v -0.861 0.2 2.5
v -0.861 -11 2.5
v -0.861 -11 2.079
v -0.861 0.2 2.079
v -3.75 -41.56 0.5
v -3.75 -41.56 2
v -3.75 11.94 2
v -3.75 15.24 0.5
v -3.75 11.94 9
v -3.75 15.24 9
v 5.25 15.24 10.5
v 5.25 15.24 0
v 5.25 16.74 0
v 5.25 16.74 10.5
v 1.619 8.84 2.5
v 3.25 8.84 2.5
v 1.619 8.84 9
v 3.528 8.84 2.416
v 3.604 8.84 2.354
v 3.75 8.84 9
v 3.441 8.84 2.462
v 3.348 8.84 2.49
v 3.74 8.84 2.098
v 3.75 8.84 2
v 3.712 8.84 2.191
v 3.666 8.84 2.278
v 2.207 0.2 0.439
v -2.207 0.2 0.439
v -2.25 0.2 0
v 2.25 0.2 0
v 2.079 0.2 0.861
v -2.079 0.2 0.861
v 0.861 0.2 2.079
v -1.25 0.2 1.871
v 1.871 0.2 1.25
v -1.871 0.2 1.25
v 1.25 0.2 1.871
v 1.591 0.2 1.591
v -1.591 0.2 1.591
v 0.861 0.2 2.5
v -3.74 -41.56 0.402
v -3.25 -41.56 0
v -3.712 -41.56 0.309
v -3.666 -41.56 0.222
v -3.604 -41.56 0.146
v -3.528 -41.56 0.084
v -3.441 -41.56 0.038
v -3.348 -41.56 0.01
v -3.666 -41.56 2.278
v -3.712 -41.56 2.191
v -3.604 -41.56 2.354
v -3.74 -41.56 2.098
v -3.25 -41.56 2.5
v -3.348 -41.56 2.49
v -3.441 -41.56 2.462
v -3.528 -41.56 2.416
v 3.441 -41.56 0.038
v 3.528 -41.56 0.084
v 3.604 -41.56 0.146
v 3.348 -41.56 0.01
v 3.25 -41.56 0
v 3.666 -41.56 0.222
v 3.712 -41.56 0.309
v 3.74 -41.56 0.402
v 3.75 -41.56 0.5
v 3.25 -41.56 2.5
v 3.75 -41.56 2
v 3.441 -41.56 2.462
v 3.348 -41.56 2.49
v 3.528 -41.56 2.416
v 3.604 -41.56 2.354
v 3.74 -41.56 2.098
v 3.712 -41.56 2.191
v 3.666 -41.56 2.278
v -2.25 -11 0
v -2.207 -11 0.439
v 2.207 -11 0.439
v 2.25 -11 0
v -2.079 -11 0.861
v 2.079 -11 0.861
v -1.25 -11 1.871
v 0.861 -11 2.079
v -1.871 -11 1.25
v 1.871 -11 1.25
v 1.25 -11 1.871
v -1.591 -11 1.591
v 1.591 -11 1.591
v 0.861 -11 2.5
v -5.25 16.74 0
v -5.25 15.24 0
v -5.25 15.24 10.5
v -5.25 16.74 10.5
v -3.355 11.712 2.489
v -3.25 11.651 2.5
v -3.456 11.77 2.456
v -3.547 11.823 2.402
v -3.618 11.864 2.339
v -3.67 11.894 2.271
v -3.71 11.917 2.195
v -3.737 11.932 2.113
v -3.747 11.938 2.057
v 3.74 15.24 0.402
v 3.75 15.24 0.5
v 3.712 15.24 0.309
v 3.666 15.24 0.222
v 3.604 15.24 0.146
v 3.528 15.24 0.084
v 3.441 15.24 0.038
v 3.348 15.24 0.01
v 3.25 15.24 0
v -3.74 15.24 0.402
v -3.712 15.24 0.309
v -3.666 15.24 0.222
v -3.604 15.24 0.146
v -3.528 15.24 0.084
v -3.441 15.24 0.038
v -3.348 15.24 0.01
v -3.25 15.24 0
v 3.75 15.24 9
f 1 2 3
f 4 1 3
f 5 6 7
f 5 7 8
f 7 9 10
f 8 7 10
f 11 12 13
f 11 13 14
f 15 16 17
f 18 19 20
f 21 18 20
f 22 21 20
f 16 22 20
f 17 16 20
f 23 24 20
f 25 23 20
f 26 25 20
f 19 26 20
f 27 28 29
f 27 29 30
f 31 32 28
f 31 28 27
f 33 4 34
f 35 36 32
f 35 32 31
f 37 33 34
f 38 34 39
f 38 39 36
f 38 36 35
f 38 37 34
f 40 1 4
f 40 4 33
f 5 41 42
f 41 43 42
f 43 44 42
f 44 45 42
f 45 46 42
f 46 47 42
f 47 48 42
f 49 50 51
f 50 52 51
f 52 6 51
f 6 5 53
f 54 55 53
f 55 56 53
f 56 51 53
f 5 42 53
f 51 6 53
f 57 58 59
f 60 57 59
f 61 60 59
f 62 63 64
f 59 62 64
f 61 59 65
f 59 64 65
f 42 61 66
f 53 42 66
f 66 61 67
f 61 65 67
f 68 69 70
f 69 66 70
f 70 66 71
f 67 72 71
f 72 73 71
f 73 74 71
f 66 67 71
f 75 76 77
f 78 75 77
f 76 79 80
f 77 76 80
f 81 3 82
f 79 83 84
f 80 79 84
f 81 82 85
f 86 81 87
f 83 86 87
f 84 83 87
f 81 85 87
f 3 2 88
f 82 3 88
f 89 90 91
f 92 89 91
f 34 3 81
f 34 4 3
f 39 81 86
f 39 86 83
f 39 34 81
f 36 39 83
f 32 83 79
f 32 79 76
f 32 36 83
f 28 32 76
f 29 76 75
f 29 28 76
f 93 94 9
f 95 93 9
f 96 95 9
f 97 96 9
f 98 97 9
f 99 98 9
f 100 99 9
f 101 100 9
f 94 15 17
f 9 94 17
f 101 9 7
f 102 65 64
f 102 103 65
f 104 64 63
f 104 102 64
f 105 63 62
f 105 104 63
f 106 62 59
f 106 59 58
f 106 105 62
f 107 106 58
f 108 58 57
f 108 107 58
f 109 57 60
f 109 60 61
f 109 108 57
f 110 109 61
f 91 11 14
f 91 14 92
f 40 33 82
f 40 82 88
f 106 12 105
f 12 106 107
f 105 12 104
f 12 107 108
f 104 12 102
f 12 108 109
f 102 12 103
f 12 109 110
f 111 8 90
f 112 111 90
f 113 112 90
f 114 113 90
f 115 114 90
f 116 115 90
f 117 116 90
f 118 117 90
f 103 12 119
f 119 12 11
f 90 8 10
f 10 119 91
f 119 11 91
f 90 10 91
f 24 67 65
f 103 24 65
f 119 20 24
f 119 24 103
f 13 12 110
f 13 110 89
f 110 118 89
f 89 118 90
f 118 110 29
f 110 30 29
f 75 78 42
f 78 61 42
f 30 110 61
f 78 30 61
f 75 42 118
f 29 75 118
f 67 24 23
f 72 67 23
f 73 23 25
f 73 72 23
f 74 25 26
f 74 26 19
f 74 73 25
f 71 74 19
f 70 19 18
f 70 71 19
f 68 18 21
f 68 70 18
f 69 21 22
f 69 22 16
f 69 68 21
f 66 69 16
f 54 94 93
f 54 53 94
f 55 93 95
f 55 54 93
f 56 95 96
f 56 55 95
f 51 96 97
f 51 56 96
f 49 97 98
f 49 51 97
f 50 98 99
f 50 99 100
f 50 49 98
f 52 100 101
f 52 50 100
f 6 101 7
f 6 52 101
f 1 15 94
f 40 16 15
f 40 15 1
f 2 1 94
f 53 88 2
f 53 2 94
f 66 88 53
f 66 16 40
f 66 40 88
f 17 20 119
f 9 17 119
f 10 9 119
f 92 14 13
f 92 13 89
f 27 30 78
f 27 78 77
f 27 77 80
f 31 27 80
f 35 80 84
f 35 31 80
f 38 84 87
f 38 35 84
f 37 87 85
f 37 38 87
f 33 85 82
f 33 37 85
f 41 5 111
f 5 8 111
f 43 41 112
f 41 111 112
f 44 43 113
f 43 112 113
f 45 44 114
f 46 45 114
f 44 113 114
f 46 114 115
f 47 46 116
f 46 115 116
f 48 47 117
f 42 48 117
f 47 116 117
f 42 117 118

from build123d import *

# Parameters (mm, degrees)
F0_W          = 6.4
F0_H          = 6.5
F0_W_2        = 4
F0_H_2        = 2.5
F1_DEPTH      = 3.75
F2_SIZE2      = 5.3693575035
F2_SIZE       = 3.1
F3_W          = 10.5
F3_H          = 10.5
F4_DEPTH      = 1.5
F6_DEPTH      = 11
F6_DEPTH_BACK = 0.2
F7_R          = 0.5


with BuildPart() as f1:
    # F0 (on Right) → F1 (new body, symmetric)
    with BuildSketch(Plane.YZ):
        Polygon((15.24, 0), (15.24, 2.5), (8.84, 2.5), (-37.56, 2.5), (-37.56, 0), align=None)
        with Locations((12.04, 5.75)):
            Rectangle(F0_W, F0_H)
        with Locations((-39.56, 1.25)):
            Rectangle(F0_W_2, F0_H_2)
    extrude(amount=F1_DEPTH, both=True)

    # F2
    f2_edges = [f1.edges().sort_by_distance(p)[0] for p in [
        (-3.75, 8.84, 5.75),
    ]]
    f2_side = f1.faces().sort_by_distance((-3.75, -7.450196, 2.269608))[0]
    chamfer(f2_edges, length=F2_SIZE, length2=F2_SIZE2, reference=f2_side)

    # F3 (on face) → F4 (join)
    with BuildSketch(Plane(origin=(0, 15.24, 0), x_dir=(-1, 0, 0), z_dir=(0, 1, 0))):
        with Locations((0, 5.25)):
            Rectangle(F3_W, F3_H)
    extrude(amount=F4_DEPTH)

    # F5 (on Front) → F6 (cut, two sides)
    with BuildSketch(Plane.XZ) as f6_sk:
        with BuildLine():
            ThreePointArc((-0.8610377228, 2.0787289482), (-1.8708066277, 1.2500330243), (-2.25, 0))
            Line((-2.25, 0), (-0.8610377228, 0))
            Line((-0.8610377228, 0), (-0.8610377228, 2.0787289482))
        make_face()
        with BuildLine():
            Line((-0.8610377228, 4.6336889094), (-0.8610377228, 2.0787289482))
            ThreePointArc((-0.8610377228, 2.0787289482), (0, 2.25), (0.8610377228, 2.0787289482))
            Line((0.8610377228, 2.0787289482), (0.8610377228, 4.6336889094))
            Line((0.8610377228, 4.6336889094), (-0.8610377228, 4.6336889094))
        make_face()
        with BuildLine():
            ThreePointArc((0.8610377228, 2.0787289482), (0, 2.25), (-0.8610377228, 2.0787289482))
            Line((-0.8610377228, 2.0787289482), (-0.8610377228, 0))
            Line((-0.8610377228, 0), (0.8610377228, 0))
            Line((0.8610377228, 0), (0.8610377228, 2.0787289482))
        make_face()
        with BuildLine():
            ThreePointArc((2.25, 0), (1.8708066277, 1.2500330243), (0.8610377228, 2.0787289482))
            Line((0.8610377228, 2.0787289482), (0.8610377228, 0))
            Line((0.8610377228, 0), (2.25, 0))
        make_face()
    extrude(amount=F6_DEPTH, mode=Mode.SUBTRACT)
    extrude(f6_sk.sketch, amount=-F6_DEPTH_BACK, mode=Mode.SUBTRACT)

    # F7
    f7_edges = [f1.edges().sort_by_distance(p)[0] for p in [
        (-3.75, -13.16, 0),
        (-3.75, -14.81, 2.5),
        (3.75, -16.36, 2.5),
        (3.75, -13.16, 0),
    ]]
    fillet(f7_edges, radius=F7_R)


solid = f1.part
